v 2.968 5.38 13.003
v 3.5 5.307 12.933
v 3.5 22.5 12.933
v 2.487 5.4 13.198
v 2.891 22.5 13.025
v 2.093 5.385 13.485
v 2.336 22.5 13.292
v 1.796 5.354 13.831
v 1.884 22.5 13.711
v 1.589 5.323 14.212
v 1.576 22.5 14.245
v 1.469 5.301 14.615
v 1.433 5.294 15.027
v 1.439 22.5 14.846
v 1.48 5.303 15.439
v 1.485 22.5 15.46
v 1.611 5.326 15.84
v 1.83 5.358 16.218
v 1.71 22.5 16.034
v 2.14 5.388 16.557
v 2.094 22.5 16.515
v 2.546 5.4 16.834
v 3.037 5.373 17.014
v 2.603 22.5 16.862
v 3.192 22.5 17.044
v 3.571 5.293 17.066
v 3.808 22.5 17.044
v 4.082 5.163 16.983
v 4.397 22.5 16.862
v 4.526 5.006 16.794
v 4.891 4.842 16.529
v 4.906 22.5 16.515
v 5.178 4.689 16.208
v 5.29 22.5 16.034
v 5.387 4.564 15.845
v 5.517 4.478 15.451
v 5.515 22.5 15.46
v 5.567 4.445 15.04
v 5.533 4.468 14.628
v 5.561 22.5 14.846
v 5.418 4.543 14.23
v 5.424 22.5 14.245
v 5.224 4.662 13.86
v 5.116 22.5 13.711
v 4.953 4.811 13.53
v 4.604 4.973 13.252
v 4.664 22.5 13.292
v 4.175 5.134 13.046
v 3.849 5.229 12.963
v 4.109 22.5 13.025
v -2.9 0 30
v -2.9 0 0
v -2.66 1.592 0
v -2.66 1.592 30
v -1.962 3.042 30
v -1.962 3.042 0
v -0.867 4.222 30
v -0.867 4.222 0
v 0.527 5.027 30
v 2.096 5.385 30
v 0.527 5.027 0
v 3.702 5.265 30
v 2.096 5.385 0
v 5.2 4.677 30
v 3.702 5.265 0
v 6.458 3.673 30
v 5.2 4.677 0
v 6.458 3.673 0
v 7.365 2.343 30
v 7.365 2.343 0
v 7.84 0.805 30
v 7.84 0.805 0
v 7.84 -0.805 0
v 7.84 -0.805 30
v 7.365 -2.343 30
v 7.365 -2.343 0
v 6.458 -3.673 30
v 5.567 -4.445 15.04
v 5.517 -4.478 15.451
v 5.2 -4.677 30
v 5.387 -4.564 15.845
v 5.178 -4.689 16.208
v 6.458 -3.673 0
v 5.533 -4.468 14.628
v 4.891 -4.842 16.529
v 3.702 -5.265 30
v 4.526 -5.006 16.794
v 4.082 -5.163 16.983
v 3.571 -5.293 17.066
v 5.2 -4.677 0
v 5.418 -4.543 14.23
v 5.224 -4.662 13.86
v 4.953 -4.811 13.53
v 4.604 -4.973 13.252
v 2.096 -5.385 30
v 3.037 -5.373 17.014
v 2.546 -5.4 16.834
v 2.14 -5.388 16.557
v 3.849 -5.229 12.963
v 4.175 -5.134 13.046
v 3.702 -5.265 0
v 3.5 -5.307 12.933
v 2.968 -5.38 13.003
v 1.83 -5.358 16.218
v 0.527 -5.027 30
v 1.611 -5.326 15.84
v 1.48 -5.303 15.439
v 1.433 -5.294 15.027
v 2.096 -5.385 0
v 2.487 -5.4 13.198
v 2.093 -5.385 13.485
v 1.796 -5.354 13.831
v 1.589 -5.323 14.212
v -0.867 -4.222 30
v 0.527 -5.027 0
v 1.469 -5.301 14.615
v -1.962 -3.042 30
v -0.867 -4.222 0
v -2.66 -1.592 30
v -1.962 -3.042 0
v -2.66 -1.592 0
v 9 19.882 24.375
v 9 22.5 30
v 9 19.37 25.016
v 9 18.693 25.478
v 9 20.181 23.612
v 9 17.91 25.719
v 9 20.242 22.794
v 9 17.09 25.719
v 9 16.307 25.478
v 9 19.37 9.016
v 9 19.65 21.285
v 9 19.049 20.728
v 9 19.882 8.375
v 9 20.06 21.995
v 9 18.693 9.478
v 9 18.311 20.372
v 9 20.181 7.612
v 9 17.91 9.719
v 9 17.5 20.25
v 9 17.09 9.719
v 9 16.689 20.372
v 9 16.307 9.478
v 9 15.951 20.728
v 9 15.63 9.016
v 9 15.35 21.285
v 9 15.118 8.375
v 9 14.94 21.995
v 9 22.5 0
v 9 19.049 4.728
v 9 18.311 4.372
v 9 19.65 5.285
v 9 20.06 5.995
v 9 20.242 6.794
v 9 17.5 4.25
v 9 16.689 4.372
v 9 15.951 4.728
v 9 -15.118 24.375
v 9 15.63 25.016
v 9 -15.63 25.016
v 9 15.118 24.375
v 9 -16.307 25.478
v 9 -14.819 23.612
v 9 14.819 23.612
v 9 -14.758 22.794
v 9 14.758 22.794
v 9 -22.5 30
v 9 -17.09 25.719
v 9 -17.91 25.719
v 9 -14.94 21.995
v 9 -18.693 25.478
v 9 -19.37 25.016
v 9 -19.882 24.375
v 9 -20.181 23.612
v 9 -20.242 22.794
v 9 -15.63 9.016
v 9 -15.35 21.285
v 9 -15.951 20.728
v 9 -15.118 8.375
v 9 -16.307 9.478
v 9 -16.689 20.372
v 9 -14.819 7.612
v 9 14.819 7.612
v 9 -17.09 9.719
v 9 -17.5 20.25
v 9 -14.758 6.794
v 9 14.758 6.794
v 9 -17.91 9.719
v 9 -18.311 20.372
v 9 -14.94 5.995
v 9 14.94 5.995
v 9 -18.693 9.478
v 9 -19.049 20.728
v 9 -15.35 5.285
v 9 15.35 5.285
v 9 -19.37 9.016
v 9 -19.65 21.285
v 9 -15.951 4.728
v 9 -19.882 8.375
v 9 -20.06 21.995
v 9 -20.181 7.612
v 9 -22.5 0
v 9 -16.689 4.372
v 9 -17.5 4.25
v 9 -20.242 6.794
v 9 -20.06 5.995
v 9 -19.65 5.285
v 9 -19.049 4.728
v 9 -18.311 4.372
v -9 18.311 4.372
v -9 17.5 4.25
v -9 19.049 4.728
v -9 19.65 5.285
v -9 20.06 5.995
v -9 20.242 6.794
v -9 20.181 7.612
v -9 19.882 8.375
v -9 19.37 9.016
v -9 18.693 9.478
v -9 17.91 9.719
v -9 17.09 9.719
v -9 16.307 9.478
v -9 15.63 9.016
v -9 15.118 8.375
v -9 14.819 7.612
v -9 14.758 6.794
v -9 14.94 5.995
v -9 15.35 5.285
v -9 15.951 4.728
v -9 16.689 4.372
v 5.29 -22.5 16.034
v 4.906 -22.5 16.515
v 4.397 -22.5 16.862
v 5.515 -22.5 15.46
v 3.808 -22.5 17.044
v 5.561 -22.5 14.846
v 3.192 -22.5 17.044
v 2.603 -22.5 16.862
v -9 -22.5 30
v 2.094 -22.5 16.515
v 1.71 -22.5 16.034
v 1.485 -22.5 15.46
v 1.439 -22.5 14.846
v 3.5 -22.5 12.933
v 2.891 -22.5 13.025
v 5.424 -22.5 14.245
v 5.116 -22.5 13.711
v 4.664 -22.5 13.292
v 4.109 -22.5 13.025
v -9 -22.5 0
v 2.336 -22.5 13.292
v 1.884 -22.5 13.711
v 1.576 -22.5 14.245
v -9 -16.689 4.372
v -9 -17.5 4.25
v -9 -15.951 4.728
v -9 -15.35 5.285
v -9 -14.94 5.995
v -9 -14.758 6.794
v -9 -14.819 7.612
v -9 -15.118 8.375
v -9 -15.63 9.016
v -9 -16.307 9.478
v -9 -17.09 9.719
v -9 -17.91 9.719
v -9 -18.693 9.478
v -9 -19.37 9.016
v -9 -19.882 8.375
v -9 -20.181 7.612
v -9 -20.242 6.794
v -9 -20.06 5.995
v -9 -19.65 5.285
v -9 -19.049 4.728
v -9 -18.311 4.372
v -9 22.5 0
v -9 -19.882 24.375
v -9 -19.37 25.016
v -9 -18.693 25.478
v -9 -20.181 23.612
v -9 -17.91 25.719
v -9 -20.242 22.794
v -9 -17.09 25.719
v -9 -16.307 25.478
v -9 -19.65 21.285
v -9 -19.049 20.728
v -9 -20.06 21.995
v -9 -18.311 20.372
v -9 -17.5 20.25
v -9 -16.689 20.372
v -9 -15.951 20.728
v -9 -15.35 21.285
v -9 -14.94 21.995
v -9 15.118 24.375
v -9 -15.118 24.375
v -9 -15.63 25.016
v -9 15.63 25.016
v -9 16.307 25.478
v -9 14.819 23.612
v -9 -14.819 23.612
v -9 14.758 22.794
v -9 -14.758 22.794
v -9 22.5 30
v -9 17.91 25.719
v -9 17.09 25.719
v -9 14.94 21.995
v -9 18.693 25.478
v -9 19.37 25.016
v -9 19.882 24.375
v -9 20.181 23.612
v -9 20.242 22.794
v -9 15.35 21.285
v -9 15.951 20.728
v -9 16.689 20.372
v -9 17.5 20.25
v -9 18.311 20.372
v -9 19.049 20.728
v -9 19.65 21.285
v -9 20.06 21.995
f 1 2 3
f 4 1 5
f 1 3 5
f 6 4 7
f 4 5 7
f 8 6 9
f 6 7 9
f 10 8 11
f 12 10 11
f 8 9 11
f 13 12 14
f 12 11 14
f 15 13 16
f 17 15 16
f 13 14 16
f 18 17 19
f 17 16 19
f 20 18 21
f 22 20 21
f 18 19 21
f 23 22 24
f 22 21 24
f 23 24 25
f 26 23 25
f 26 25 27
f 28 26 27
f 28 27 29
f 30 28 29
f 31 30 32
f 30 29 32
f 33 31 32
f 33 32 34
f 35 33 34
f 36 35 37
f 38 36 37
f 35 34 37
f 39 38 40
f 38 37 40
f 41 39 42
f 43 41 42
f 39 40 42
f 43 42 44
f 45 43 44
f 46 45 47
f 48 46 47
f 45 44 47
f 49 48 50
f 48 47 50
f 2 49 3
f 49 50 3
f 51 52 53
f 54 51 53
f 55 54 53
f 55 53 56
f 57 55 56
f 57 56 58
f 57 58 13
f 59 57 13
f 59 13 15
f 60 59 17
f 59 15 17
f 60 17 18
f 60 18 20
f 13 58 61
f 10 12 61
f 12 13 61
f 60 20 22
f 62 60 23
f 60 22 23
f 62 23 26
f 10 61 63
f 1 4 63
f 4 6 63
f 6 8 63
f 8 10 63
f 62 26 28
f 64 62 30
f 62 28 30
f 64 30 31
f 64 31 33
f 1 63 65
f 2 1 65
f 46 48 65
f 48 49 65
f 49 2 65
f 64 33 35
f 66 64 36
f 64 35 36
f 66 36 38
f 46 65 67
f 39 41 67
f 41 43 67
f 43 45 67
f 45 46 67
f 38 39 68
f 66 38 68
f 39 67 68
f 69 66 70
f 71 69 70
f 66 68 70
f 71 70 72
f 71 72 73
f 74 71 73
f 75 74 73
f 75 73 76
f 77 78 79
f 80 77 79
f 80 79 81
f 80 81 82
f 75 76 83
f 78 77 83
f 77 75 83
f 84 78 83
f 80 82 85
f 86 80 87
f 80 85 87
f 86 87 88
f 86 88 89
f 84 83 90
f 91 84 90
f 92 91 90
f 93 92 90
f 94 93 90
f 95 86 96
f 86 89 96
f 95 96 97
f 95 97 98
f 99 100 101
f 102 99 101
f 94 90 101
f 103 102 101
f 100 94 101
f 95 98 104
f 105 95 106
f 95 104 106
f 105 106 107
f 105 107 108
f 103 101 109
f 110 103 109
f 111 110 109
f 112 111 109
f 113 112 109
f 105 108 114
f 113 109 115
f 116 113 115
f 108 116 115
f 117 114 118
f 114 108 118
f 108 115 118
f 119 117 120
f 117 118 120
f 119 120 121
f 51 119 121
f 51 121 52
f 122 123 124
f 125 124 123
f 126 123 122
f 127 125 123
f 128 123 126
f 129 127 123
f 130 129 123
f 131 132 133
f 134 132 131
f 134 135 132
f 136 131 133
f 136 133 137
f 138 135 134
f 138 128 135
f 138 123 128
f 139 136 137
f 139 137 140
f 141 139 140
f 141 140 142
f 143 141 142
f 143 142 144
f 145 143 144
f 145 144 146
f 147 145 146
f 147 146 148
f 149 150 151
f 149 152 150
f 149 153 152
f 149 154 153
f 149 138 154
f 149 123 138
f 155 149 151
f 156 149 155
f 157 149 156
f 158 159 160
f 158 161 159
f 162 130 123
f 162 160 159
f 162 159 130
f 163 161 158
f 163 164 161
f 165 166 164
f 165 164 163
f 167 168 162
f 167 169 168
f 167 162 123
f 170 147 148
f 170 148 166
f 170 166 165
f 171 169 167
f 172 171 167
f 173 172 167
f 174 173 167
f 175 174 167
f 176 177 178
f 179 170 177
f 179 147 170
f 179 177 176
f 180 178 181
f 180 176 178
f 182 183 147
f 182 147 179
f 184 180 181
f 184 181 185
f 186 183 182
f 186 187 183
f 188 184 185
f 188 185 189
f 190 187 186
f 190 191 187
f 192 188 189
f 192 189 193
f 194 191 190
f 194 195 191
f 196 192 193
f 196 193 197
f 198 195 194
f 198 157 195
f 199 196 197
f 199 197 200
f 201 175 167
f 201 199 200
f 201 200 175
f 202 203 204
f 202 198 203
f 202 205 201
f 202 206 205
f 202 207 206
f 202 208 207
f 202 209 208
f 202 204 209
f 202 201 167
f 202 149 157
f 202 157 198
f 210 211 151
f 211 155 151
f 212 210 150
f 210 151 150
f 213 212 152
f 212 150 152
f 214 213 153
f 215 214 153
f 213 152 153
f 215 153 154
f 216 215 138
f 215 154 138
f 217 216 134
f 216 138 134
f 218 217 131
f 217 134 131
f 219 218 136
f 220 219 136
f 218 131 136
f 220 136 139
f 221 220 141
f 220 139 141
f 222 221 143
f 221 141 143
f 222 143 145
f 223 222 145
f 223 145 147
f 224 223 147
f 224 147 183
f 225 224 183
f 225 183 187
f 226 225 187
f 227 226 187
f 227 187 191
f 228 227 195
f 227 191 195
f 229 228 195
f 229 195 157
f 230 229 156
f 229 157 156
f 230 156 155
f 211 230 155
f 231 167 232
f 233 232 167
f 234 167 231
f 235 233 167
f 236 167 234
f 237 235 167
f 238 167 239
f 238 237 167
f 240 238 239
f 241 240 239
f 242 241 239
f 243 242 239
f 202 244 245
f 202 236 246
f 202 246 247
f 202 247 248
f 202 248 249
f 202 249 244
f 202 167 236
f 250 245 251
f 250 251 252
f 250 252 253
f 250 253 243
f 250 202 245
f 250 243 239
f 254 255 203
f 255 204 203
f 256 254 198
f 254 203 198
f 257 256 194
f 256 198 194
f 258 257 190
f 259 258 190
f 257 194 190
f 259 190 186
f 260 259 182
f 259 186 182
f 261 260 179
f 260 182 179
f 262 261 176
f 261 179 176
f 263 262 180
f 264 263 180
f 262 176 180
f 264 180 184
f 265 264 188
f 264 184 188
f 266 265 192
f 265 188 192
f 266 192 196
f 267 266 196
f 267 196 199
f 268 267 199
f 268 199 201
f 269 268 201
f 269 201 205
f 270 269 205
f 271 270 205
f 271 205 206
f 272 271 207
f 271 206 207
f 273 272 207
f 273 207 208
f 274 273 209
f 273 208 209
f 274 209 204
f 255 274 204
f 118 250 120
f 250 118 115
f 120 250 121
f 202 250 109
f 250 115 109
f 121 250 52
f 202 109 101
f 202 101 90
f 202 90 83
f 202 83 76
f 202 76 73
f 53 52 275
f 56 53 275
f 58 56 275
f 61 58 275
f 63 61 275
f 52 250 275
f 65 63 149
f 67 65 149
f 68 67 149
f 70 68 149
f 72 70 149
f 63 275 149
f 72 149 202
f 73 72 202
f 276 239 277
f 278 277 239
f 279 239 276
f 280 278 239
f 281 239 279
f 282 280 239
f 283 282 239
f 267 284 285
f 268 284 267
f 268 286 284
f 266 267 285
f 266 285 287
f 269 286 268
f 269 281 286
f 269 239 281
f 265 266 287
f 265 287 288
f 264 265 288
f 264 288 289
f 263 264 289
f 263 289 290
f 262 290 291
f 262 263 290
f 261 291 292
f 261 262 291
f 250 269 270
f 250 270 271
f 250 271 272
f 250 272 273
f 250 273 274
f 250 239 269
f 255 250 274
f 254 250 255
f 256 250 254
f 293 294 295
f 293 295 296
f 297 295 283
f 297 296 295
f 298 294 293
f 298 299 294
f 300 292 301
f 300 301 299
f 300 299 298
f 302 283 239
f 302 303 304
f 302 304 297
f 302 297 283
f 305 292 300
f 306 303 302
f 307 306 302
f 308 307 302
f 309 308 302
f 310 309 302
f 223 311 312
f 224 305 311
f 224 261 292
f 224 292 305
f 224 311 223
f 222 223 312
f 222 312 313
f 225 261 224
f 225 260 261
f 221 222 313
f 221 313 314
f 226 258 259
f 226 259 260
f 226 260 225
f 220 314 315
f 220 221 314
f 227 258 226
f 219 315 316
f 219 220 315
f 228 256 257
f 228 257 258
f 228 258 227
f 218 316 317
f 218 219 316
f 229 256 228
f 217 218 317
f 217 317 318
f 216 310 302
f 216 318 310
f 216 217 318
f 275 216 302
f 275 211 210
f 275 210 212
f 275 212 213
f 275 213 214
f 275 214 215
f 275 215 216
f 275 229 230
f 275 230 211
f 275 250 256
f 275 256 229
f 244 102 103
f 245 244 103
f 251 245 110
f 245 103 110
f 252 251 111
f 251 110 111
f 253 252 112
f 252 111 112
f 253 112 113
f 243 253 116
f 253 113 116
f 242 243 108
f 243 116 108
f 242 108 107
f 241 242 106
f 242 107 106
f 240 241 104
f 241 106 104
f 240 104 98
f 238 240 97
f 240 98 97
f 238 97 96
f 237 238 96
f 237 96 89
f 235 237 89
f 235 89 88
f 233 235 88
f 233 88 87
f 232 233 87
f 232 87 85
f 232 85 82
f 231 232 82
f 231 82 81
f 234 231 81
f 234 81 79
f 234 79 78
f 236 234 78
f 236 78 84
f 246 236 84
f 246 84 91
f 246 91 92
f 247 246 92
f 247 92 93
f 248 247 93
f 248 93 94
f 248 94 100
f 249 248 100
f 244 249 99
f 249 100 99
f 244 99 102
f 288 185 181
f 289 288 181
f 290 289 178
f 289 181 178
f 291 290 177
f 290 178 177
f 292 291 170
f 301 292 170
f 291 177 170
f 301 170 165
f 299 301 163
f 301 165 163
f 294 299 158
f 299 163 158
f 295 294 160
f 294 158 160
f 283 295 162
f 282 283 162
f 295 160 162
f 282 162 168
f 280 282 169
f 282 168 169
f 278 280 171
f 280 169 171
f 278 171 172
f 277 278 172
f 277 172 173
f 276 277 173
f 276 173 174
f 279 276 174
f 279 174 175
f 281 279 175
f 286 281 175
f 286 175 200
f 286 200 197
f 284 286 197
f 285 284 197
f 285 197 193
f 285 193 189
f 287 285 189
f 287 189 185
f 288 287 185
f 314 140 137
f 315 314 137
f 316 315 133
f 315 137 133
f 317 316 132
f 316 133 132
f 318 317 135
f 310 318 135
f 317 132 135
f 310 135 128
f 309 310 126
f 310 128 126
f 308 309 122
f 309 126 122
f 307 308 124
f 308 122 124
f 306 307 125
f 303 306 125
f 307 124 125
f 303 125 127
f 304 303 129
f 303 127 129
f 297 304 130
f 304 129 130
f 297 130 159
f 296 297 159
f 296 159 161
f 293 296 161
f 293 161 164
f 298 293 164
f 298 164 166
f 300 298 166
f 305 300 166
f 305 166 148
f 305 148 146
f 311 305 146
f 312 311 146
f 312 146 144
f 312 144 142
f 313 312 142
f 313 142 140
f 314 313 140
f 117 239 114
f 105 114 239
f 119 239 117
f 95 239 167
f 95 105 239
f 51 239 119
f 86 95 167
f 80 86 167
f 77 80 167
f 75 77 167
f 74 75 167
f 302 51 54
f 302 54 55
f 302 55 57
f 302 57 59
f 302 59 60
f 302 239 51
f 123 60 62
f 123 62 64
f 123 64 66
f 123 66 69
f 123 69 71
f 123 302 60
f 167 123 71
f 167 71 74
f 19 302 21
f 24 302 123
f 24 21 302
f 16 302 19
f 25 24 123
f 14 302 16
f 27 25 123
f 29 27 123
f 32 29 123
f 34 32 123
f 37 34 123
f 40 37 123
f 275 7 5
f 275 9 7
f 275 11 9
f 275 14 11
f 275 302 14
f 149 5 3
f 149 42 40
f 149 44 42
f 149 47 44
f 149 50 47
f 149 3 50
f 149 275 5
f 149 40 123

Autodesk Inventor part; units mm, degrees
ref_plane "YZ Plane" through (0, 0, 0) normal (1, 0, 0) x (0, 1, 0)
ref_plane "XZ Plane" through (0, 0, 0) normal (0, 1, 0) x (-1, 0, 0)
ref_plane "XY Plane" through (0, 0, 0) normal (0, 0, 1) x (1, 0, 0)
sketch "Sketch1" plane through (0, 0, 0) normal (0, 0, 1) x (1, 0, 0)
  line L0 (-9, 22.5) -> (9, 22.5)
  line L1 (9, 22.5) -> (9, -22.5)
  line L2 (9, -22.5) -> (-9, -22.5)
  line L3 (-9, -22.5) -> (-9, 22.5)
  point P0 (0, 0)
  point P1 (0, 22.5)
  point P2 (-9, 0)
  dimension "d0" = 18
  dimension "d1" = 45
extrude "Extrusion1" add sketch "Sketch1" along normal blind 30
sketch "Sketch3" plane through (0, 0, 0) normal (0, 0, -1) x (-1, 0, 0)
  circle A0 centre (-2.5, 0) radius 5.4
  line L0 (-9, -22.5) -> (-9, 22.5) projected
  point P0 (-9, 0)
  dimension "d4" = 10.8
  dimension "d5" = 6.5
extrude "Extrusion2" cut sketch "Sketch3" against normal through all
sketch "Sketch4" plane through (9, -22.5, 0) normal (1, 0, 0) x (0, 0, -1)
  circle A0 centre (-7, 40) radius 2.75
  circle A1 centre (-7, 5) radius 2.75
  line L0 (0, 0) -> (0, 45) projected
  line L1 (0, 45) -> (-30, 45) projected
  line L2 (0, 0) -> (-30, 0) projected
  circle A2 centre (-23, 40) radius 2.75
  circle A3 centre (-23, 5) radius 2.75
  line L3 (-30, 0) -> (-30, 45) projected
  point P0 (0, 22.5)
  dimension "d8" = 5.5
  dimension "d9" = 5.5
  dimension "d10" = 7
  dimension "d11" = 5
  dimension "d12" = 5
  dimension "d13" = 7
  dimension "d16" = 35
  dimension "d17" = 16
extrude "Extrusion3" cut sketch "Sketch4" against normal through all contours A1
pattern_linear "Rectangular Pattern1" count 2 spacing 16 along (0, 0, 1) count 2 spacing 35 along (0, 1, 0) of "Extrusion3"
sketch "Sketch5" plane through (-9, -22.5, 0) normal (0, -1, 0) x (1, 0, 0)
  line L0 (0, 0) -> (0, 30) projected
  line L1 (0, 0) -> (18, 0) projected
  point P0 (12.5, 15)
  point P1 (0, 15)
  point P2 (9, 0)
  dimension "d38" = 12.5
hole "Hole1" at (3.5, -22.5, 15) direction (0, 1, 0) diameter 4.134 end through all thread size "M5x0.8" class "6H" standard "ISO Metric profile"
equation "\"d13\" = d10"
properties part number "0005-10-015 suport tija" material "Wood (Maple)"
